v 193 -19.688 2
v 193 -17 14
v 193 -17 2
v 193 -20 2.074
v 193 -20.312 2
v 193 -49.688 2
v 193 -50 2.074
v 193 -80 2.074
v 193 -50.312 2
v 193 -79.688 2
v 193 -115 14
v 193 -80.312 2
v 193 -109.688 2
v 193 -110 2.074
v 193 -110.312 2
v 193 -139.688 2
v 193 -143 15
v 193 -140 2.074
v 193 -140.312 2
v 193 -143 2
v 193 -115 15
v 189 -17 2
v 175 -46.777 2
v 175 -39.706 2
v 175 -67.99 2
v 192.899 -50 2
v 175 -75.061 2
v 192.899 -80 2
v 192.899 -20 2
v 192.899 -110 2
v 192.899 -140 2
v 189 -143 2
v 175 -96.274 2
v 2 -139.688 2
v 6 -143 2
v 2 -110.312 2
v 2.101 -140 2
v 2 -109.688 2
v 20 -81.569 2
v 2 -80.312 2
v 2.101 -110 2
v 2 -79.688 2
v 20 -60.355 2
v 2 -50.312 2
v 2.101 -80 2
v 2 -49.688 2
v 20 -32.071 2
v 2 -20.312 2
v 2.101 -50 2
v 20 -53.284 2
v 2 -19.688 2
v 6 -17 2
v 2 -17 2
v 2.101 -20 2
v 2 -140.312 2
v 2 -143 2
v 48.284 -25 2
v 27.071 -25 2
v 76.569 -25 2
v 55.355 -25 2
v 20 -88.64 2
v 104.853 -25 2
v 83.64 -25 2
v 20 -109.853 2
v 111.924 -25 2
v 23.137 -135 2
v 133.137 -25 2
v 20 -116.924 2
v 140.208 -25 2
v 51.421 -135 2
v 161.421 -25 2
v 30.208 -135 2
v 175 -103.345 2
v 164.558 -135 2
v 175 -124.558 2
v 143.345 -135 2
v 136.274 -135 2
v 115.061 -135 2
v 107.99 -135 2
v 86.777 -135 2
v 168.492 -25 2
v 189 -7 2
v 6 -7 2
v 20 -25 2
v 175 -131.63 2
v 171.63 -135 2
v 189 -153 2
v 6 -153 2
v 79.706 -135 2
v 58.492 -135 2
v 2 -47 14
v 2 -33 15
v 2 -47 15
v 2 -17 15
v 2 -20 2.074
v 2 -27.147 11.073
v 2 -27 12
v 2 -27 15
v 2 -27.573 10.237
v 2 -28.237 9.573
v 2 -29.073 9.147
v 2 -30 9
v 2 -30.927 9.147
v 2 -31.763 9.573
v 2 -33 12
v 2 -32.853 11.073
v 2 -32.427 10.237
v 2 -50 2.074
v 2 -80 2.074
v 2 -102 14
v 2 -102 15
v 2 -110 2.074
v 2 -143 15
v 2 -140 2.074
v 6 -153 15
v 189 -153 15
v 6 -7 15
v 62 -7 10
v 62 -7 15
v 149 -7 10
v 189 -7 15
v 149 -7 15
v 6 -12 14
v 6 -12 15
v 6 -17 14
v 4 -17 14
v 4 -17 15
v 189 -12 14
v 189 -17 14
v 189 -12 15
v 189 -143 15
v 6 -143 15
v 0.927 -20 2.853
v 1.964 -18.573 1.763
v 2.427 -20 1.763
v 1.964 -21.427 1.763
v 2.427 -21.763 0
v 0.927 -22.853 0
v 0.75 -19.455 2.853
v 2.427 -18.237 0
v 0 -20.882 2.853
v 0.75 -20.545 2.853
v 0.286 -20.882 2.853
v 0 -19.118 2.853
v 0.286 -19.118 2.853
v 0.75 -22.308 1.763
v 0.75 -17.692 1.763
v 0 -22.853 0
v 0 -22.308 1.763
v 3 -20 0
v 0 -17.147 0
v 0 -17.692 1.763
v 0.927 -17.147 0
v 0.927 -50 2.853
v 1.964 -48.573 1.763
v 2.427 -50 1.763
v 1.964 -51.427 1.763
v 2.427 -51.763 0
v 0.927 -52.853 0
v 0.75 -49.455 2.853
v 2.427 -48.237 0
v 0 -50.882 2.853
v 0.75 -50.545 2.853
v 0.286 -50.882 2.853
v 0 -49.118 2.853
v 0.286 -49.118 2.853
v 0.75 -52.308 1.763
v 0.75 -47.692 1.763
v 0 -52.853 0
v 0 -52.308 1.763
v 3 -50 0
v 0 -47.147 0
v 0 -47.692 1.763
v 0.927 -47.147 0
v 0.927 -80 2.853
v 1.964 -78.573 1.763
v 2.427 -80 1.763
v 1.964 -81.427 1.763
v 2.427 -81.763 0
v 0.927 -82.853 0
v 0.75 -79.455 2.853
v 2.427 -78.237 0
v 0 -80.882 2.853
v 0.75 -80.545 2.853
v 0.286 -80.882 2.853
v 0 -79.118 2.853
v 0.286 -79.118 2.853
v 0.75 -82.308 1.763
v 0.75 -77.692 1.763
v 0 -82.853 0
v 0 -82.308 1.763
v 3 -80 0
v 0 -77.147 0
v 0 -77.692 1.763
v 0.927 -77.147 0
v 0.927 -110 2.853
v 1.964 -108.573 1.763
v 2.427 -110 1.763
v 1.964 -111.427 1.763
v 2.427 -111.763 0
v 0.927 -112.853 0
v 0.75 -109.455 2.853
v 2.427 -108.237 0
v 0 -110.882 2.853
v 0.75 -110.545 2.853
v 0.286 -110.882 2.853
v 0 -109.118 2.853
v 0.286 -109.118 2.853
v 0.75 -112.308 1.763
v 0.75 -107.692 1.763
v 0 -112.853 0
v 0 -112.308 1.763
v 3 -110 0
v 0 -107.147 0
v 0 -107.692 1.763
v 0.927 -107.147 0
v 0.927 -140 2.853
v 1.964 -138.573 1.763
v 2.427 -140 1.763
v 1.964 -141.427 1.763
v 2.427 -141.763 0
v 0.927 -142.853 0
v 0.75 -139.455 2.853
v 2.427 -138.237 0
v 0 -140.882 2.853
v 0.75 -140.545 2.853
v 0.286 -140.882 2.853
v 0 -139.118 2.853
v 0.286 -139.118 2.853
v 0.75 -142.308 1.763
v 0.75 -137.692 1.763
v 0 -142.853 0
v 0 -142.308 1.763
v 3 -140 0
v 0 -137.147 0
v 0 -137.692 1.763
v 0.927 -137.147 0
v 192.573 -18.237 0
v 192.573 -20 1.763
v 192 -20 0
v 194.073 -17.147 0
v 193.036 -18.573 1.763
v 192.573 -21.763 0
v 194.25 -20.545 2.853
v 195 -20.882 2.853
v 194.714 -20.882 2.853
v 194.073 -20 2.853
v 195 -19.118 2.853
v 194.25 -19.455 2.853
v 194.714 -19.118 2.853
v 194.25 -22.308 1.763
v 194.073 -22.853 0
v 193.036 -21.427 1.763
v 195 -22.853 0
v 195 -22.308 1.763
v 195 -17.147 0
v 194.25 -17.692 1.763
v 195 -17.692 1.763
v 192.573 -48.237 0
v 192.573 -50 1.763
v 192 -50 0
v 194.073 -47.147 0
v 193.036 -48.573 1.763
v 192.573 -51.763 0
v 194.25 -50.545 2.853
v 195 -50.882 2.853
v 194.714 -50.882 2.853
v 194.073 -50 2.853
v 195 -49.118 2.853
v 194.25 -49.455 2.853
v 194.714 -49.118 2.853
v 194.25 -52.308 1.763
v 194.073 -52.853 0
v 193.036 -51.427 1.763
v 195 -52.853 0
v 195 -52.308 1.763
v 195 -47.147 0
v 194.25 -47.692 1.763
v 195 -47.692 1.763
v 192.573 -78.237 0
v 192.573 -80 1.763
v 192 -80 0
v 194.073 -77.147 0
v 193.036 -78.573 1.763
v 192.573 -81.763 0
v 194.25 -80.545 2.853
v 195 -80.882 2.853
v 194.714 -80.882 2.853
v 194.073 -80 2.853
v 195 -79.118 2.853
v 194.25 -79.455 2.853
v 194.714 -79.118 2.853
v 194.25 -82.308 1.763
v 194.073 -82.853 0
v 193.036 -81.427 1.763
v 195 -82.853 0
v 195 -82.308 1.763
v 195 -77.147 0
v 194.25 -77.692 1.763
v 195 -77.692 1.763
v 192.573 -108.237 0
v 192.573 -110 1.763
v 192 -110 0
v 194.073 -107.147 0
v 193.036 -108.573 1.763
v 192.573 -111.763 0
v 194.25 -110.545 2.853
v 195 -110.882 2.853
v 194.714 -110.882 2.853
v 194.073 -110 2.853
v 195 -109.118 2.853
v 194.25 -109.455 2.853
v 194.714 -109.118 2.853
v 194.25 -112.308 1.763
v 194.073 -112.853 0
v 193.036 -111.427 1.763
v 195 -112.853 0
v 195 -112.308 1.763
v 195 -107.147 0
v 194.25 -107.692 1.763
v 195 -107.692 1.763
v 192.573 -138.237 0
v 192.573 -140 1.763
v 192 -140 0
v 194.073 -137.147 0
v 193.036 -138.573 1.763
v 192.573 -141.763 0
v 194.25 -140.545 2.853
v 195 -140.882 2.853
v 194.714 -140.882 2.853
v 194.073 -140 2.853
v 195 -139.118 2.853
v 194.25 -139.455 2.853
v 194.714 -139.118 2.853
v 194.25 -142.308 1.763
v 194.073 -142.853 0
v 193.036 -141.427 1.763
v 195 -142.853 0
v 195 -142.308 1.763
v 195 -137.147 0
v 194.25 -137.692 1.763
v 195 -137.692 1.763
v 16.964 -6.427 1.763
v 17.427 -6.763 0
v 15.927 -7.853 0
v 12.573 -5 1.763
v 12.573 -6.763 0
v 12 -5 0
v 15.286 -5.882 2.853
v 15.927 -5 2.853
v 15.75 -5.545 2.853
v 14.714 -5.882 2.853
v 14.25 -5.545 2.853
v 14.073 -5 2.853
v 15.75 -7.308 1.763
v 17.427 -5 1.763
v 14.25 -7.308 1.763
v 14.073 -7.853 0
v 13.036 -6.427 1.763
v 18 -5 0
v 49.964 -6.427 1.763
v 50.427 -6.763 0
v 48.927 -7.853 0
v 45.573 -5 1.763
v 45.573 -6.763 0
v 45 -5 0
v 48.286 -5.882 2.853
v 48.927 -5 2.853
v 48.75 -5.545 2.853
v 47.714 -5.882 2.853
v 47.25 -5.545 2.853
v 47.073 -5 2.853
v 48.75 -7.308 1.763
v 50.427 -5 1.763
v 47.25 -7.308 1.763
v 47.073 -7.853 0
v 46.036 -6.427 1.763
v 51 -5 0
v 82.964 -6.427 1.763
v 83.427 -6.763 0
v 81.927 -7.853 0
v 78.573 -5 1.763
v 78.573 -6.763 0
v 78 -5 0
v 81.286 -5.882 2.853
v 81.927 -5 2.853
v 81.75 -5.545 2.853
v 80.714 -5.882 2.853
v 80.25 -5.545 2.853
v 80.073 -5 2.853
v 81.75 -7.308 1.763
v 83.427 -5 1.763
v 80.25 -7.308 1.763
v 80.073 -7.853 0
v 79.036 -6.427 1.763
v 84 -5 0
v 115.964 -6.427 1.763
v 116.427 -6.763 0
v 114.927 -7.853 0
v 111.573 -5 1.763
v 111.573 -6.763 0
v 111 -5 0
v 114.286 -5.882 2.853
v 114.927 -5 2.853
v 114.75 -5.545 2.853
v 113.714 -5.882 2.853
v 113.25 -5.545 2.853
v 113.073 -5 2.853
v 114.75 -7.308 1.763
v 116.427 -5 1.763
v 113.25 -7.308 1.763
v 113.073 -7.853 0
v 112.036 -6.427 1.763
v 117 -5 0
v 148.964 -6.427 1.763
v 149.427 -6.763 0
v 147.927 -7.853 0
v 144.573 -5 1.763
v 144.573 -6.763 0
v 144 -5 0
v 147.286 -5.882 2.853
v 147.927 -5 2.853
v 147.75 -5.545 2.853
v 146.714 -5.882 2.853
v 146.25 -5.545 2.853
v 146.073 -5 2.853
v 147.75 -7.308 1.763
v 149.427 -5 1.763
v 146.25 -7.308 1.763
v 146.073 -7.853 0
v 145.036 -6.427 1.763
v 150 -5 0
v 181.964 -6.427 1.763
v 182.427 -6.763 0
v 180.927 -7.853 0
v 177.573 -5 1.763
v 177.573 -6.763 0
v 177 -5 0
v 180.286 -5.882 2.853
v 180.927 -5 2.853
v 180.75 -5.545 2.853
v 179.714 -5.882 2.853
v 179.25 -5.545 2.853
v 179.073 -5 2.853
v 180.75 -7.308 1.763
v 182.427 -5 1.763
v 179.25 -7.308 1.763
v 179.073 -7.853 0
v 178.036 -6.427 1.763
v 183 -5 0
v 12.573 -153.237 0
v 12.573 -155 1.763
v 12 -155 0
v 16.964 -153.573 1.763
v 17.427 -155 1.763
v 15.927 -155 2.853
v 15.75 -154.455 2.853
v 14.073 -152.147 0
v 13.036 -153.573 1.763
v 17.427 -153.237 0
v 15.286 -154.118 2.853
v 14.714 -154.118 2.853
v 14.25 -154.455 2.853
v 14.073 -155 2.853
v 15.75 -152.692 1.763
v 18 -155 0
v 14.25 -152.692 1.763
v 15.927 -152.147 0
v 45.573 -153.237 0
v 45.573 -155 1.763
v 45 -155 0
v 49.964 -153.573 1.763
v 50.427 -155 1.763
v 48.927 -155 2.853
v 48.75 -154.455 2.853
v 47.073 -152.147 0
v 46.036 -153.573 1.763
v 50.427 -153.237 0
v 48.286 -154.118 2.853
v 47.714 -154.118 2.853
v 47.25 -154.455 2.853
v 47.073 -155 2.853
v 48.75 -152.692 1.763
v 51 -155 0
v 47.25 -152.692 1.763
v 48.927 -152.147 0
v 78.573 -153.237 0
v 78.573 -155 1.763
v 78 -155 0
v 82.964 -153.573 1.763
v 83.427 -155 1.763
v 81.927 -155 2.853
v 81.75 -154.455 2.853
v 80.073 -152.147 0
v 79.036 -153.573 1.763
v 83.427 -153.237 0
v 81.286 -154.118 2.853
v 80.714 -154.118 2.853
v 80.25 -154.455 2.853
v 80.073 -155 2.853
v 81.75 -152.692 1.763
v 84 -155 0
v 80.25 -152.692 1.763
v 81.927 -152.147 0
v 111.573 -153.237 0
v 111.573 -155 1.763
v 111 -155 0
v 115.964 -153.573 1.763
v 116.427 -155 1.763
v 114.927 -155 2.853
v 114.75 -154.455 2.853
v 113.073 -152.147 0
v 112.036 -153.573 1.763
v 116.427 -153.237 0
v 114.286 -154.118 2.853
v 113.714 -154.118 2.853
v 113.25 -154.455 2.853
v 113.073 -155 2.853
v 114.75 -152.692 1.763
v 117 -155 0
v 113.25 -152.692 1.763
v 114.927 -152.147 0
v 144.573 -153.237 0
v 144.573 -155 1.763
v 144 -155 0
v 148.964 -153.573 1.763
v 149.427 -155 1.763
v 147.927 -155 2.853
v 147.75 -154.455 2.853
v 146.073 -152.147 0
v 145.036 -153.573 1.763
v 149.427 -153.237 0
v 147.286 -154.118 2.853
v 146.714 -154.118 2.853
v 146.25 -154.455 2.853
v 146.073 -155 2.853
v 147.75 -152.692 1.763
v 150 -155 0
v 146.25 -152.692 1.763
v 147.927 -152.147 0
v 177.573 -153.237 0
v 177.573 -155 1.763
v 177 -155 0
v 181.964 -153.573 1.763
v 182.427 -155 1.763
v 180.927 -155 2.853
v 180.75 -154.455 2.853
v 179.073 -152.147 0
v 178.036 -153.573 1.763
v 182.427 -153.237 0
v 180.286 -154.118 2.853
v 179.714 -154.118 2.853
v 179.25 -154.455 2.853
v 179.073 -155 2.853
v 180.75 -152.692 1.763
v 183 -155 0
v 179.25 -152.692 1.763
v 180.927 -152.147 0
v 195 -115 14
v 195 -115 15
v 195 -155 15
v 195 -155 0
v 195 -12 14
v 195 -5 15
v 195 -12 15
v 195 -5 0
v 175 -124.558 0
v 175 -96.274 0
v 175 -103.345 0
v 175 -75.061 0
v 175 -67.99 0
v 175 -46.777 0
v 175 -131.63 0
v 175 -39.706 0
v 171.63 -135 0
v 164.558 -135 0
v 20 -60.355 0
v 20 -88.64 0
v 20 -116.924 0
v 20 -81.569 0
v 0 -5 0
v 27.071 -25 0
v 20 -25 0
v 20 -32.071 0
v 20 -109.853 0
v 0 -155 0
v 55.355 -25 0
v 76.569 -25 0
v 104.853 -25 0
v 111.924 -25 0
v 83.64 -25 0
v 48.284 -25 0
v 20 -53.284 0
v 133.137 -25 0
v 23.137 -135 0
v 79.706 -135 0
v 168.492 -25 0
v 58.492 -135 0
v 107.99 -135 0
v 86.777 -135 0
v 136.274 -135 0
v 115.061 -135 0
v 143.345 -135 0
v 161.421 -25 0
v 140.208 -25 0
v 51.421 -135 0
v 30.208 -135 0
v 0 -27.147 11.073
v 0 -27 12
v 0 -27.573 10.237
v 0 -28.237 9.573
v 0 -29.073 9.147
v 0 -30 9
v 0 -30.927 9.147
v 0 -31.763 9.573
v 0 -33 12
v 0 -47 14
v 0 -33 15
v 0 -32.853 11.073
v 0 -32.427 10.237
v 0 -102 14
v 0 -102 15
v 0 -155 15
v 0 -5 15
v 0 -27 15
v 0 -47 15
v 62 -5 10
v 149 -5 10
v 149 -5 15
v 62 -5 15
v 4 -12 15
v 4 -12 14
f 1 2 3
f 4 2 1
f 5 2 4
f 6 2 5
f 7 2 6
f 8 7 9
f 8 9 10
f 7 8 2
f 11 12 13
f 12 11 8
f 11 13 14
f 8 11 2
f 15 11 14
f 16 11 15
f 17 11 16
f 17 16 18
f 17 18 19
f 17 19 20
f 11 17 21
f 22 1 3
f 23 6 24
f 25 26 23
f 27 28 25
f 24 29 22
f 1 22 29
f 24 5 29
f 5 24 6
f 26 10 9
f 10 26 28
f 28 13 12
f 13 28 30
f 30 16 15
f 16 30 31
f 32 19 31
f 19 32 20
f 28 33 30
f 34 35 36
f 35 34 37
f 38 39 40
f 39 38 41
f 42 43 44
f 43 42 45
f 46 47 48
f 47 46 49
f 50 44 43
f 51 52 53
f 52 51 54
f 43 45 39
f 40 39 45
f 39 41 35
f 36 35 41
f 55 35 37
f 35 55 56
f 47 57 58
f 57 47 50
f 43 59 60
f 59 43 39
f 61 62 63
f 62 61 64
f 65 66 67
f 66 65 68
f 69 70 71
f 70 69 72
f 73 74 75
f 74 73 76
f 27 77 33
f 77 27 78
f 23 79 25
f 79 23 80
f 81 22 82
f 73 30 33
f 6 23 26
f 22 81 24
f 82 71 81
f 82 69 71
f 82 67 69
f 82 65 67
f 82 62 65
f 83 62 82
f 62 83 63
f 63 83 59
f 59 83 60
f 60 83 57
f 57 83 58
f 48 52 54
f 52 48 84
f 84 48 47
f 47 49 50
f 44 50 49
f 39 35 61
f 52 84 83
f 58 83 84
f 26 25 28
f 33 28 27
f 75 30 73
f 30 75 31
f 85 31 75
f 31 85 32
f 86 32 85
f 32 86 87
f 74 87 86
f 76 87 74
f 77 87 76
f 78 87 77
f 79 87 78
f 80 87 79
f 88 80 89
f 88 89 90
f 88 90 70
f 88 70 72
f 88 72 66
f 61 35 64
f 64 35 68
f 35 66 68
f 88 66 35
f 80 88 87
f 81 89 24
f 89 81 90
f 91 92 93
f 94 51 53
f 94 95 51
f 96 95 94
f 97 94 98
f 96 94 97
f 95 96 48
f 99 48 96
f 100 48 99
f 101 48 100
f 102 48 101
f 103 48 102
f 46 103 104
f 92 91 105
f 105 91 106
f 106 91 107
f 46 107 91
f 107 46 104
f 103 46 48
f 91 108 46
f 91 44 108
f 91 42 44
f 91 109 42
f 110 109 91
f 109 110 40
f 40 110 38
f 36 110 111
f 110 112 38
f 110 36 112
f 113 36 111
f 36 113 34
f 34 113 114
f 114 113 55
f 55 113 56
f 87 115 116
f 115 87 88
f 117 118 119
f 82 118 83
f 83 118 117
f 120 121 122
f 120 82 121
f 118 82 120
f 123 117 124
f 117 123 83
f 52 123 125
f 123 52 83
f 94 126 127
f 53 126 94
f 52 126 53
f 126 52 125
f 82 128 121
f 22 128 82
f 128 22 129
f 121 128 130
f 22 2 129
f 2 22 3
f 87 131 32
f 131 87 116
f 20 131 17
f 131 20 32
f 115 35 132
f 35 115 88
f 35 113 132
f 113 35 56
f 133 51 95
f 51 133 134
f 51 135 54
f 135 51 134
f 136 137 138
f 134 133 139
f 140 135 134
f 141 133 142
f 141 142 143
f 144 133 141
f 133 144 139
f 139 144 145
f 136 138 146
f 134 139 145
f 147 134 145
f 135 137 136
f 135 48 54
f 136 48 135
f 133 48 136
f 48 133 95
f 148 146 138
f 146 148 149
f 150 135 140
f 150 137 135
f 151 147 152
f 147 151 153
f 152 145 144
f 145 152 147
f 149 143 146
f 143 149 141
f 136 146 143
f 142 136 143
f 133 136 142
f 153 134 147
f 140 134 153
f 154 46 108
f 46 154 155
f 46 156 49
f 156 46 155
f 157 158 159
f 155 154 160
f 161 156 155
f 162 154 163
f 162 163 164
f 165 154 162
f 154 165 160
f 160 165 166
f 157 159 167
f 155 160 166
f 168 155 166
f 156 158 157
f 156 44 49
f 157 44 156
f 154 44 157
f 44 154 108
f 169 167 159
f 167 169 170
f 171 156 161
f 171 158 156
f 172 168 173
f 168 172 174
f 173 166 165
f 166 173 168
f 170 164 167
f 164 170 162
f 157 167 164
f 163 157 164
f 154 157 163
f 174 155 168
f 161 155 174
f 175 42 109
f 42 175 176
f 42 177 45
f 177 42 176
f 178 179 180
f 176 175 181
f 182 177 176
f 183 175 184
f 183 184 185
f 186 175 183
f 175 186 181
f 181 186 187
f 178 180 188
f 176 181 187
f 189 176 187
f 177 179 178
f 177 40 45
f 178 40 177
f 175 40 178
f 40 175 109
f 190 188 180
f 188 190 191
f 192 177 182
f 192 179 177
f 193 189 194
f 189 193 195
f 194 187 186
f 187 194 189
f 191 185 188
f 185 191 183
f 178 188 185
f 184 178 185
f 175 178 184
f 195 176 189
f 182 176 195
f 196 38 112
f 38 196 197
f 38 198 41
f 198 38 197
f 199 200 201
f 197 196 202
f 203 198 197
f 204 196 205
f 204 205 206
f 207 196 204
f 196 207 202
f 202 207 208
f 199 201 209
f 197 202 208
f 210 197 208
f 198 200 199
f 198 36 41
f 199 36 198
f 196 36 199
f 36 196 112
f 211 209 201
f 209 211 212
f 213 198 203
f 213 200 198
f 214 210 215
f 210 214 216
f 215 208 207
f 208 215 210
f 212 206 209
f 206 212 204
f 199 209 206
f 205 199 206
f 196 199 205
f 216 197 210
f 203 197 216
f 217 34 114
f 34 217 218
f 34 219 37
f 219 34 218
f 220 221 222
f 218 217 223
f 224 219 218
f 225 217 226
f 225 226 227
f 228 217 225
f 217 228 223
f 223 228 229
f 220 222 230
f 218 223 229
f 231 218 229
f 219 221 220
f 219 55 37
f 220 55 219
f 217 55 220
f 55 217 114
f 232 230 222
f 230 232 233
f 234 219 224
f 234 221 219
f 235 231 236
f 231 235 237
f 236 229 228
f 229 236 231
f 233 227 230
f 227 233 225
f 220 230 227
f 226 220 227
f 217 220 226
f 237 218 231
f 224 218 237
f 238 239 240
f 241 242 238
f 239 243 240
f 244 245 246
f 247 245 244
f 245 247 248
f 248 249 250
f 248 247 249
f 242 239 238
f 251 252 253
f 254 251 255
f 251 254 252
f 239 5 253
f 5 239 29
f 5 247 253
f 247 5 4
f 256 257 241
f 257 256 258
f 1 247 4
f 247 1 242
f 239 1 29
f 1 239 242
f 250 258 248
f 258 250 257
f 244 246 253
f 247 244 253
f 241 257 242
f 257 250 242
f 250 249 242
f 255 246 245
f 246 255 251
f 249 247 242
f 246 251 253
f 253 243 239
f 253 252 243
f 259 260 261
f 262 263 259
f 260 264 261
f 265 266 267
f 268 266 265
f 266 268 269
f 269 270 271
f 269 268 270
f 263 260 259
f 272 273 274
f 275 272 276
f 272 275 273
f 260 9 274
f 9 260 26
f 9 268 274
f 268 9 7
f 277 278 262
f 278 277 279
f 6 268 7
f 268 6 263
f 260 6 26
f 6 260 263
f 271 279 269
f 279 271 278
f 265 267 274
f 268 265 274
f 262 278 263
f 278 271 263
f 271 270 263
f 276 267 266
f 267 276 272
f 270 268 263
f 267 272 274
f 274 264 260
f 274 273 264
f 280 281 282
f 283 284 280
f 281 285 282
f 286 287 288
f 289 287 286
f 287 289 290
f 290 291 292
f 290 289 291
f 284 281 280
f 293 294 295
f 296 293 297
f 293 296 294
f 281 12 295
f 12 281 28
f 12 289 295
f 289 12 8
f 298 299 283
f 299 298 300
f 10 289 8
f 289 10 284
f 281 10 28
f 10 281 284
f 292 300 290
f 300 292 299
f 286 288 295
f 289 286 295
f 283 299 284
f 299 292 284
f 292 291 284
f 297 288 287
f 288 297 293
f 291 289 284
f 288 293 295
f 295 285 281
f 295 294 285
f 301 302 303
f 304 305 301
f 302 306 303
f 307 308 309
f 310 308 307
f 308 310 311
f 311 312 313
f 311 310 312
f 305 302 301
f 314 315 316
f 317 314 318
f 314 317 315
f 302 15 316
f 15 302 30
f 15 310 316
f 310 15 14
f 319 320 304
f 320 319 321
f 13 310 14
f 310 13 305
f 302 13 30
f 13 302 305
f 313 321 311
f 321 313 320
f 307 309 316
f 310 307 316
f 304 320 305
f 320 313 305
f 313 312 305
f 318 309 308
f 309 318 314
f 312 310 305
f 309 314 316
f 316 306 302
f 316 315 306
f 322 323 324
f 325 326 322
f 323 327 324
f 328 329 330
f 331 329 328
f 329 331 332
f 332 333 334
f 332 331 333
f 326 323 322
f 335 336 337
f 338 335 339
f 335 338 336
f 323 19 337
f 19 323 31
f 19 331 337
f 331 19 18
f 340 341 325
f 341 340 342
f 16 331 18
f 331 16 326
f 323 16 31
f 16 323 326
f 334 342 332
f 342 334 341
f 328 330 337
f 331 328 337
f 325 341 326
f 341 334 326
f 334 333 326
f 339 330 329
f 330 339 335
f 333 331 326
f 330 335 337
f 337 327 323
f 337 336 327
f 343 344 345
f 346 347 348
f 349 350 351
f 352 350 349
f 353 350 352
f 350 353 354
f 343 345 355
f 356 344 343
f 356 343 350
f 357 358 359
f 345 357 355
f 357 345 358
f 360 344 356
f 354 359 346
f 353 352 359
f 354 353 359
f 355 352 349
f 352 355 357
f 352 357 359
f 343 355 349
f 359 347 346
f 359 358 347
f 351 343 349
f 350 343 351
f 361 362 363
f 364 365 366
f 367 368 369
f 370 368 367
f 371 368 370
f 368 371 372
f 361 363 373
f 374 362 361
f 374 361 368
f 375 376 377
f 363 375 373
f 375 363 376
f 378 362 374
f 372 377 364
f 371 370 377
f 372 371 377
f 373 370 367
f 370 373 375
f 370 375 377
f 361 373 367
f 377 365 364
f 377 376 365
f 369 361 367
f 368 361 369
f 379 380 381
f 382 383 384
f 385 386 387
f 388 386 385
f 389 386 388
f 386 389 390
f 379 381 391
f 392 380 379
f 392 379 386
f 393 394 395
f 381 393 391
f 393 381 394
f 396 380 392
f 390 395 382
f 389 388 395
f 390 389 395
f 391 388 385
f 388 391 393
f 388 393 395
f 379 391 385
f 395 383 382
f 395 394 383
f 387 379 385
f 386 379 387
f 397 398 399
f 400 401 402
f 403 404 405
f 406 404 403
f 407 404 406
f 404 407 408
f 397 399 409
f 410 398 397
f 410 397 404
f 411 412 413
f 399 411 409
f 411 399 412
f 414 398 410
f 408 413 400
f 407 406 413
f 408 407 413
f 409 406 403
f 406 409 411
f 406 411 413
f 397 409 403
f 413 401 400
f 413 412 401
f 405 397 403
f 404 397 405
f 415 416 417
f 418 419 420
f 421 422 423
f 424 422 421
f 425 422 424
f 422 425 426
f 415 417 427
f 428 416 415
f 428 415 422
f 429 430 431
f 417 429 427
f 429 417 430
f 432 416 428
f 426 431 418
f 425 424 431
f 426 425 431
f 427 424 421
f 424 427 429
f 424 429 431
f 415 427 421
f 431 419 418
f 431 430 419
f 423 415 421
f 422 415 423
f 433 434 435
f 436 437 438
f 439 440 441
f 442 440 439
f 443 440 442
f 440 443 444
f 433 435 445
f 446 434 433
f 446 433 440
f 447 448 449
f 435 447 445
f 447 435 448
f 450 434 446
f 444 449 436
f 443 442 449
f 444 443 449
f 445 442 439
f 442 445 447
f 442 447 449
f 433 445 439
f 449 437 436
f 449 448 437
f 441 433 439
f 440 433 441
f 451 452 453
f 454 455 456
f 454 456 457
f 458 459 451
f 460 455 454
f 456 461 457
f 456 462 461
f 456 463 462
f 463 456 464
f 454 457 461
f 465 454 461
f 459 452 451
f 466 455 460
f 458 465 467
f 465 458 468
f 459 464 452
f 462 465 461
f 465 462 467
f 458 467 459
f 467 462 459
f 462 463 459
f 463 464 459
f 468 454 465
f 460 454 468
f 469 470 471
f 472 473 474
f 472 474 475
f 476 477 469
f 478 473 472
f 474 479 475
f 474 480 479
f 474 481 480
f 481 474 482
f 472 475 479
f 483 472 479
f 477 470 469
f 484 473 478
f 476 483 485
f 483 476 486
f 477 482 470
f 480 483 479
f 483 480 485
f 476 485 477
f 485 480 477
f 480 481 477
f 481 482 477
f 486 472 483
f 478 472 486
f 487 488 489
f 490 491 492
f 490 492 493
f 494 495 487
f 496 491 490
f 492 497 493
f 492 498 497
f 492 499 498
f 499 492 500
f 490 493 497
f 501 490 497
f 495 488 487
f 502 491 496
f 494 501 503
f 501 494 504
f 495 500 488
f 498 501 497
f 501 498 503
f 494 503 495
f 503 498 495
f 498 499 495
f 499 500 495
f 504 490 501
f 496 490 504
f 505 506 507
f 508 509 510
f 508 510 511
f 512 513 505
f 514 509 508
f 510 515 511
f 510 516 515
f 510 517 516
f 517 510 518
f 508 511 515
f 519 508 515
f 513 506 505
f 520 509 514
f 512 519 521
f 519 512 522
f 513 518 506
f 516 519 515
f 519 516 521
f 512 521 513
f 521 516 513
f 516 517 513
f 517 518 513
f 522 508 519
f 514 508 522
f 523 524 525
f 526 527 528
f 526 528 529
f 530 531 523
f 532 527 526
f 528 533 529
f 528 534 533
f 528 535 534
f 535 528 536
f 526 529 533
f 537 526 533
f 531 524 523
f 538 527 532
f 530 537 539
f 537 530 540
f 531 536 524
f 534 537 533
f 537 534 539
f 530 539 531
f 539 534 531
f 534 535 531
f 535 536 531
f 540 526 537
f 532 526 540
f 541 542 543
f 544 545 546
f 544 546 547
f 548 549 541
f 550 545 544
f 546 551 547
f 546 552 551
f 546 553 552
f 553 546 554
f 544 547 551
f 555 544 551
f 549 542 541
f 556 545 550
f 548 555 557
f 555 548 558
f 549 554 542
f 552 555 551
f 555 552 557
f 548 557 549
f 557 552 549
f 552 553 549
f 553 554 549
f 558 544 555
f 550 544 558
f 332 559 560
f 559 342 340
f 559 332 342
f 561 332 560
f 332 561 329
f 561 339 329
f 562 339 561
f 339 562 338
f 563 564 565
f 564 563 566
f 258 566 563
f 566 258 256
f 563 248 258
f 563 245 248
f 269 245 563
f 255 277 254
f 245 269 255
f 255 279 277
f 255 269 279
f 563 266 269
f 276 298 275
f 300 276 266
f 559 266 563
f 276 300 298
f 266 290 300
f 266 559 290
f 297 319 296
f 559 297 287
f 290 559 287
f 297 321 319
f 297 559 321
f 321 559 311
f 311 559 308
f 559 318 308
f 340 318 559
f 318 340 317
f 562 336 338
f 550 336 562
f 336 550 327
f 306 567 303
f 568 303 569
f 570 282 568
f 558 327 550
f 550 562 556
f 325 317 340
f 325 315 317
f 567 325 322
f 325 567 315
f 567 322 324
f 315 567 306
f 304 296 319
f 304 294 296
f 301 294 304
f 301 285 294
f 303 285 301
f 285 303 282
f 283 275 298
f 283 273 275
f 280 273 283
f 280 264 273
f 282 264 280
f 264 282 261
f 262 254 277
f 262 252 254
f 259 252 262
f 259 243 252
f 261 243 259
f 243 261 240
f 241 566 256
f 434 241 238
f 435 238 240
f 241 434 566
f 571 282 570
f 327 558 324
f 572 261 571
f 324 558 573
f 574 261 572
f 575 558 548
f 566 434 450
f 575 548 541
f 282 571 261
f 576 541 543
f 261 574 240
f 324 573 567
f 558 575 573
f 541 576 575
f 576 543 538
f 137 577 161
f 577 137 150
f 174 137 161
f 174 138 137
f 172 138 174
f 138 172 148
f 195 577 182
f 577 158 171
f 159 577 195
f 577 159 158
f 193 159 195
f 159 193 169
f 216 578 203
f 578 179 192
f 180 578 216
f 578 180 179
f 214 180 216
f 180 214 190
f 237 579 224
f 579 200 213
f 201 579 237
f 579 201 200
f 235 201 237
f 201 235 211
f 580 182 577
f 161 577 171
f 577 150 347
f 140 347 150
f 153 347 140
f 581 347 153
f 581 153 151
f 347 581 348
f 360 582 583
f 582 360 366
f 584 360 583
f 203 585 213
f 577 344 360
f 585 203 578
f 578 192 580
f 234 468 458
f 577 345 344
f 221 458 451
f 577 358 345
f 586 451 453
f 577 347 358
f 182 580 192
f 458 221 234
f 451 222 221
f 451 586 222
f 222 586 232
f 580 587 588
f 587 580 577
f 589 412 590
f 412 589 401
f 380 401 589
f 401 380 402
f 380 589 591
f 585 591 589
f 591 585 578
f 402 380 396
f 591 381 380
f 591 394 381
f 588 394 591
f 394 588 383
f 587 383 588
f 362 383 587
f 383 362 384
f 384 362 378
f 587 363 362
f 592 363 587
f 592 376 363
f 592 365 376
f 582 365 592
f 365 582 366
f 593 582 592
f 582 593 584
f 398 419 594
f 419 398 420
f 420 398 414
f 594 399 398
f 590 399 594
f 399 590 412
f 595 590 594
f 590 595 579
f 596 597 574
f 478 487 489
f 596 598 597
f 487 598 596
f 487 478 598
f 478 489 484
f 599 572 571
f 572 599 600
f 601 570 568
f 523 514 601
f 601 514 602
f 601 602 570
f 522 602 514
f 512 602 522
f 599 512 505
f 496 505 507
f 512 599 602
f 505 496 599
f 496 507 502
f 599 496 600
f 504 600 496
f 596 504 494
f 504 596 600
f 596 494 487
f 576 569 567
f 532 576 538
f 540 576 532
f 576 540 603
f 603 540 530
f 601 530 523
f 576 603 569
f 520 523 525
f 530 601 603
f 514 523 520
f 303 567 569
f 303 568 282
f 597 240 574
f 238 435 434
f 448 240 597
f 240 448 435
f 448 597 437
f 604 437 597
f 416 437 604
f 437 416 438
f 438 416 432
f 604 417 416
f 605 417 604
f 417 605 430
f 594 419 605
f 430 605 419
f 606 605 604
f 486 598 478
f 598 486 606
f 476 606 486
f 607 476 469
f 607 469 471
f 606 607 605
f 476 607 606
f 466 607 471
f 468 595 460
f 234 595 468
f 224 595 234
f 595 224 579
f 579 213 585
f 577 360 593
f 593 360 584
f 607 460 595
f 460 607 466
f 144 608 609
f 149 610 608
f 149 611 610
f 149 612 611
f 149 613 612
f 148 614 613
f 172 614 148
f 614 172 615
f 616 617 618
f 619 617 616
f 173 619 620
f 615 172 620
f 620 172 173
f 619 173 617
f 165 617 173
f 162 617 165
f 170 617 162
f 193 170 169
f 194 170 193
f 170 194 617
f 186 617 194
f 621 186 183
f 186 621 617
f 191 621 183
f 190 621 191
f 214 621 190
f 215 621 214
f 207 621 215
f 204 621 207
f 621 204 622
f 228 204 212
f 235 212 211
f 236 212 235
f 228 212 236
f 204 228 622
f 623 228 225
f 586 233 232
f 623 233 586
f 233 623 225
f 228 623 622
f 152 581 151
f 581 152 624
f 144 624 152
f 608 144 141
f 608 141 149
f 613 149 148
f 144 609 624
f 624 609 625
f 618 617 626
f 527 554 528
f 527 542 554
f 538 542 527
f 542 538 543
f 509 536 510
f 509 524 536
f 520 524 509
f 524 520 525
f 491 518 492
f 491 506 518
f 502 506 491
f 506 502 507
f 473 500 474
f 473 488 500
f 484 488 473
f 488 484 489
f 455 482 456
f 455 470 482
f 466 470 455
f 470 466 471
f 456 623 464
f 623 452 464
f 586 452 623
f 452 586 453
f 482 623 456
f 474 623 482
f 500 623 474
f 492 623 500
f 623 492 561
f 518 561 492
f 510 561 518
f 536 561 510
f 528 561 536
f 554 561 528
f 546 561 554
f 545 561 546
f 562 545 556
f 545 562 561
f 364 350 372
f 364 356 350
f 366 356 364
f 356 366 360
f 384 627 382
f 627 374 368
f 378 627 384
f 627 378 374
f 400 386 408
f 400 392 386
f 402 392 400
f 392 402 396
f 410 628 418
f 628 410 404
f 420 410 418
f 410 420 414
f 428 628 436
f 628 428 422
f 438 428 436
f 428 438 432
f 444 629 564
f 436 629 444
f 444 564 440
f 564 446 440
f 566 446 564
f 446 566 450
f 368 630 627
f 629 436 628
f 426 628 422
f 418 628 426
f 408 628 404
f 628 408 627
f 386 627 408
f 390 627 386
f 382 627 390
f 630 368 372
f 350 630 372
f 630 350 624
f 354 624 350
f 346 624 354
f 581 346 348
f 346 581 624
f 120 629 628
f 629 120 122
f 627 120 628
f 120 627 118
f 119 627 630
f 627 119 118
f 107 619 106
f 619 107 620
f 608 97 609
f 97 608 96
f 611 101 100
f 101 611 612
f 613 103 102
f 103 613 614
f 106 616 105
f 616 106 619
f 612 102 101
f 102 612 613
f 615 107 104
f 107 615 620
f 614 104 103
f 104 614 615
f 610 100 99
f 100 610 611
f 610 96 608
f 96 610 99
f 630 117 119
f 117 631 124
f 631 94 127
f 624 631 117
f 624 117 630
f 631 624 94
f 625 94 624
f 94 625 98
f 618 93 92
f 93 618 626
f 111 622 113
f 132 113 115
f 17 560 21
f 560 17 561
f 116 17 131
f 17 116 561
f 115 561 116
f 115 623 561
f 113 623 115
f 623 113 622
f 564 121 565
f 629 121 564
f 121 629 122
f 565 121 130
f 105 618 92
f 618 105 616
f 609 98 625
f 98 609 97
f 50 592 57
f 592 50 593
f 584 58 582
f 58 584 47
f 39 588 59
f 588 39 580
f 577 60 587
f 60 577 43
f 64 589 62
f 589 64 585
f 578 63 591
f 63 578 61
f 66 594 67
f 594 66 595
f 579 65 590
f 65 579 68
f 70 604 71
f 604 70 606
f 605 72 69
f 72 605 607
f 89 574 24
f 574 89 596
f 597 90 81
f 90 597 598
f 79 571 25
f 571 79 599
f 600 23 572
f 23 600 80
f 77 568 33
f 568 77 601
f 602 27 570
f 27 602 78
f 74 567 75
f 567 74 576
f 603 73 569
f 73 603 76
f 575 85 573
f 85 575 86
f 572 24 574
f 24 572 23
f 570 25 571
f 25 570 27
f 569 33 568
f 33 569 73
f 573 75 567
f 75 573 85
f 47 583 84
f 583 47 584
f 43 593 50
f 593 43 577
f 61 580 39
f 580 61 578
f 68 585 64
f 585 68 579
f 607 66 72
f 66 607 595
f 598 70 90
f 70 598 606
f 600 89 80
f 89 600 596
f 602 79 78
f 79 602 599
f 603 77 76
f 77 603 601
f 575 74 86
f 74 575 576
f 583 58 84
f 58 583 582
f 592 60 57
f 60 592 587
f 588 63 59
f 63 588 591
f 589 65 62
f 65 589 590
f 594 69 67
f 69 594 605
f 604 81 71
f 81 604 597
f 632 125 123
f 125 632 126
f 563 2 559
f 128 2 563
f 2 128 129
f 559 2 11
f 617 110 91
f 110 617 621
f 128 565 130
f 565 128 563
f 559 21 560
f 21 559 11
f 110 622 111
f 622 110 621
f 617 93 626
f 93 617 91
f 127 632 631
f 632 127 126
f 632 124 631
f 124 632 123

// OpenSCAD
// file: peb_shell.scad
//test=1;

// Set led_height if 'tipi' or other odd board
// set print_bottom=1 to render bottom of shell
// set print_top=1 to render top of shell

module reliefPoint() {
    sphere(r=3);

    translate([0,0,22])
    sphere(r=3);
}

module vertReliefPoints() {
    for (iy = [15:30:140]) {  
        translate([0,iy,0])
        reliefPoint();
    }
}

module horizReliefPoints() {
    for (ix = [15:33:185]) {
        translate([ix,0,0])
        reliefPoint();
    }
}

module case_template() {
    difference() {
        cube([195,150,22]);
      
        translate([62,-1,2])
        cube([87,20,10]);  
        
        translate([2,2,2])
        difference() {
            cube([191,146,18]);
            
            cube([4,10,18]);
            
            translate([191-4,0,0])
            cube([4,10,18]);
            
            translate([191-4,146-10,0])
            cube([4,10,18]);
            
            translate([0,146-10,0])
            cube([4,10,18]);
        }
        
        lh = led_height ? led_height : 25;
        translate([0,lh,10])
        rotate([0,90,0])
        cylinder(h=6,d=6,center=true,$fn=20);
        
        translate([0,lh-3,7.0])
        cube([6,6,3]);
        
        vertReliefPoints();
        
        translate([195,0,0])
        vertReliefPoints();
        
        horizReliefPoints();
        
        translate([0,150,0])
        horizReliefPoints();
    }
}

module reduced_plane() {
    translate([20,20,0])
    difference() {
        cube([195-40,150-40,22]);

        rotate([0,0,-45])
        translate([-200,0,0])
        union() {
            for(iy = [5:20:250]) {
                translate([0,iy,0])
                cube([400,15,22]);
            }
        }
    }
}

module bottom() {
    difference() {
        case_template();
        
        pcboard();
        
        translate([0,0,7])
        cube([195,150,22]);
        
        reduced_plane();
    }
}

module top() {
    difference() {
        case_template();
      
        pcboard();

        cube([195,150,7]);
        
        reduced_plane();
    }
}

if (print_bottom||test) {
    translate([0,5,0])
    bottom();
}

if (print_top||test) {
    rotate([180,0,0])
    translate([0,5,-22])
    top();
}
// main file
module pcboard() {
    
    translate([2,1,7-1])
    linear_extrude(height=2)
    polygon(points=[
      [2,6],
      [58,6],
      [58,12],
      [62,12],
      [62,0],
      [141,0],
      [141,12],
      [145,12],
      [145,6],
      [197,6],
      [197,109],
      [2,109],
      [2,96],
      [-10,96],
      [-10,41],
      [2,41]
    ]);
}

//nofill=1;
print_top=1;
print_bottom=0;
led_height=25;

test=0;

include <peb_shell.scad>;
